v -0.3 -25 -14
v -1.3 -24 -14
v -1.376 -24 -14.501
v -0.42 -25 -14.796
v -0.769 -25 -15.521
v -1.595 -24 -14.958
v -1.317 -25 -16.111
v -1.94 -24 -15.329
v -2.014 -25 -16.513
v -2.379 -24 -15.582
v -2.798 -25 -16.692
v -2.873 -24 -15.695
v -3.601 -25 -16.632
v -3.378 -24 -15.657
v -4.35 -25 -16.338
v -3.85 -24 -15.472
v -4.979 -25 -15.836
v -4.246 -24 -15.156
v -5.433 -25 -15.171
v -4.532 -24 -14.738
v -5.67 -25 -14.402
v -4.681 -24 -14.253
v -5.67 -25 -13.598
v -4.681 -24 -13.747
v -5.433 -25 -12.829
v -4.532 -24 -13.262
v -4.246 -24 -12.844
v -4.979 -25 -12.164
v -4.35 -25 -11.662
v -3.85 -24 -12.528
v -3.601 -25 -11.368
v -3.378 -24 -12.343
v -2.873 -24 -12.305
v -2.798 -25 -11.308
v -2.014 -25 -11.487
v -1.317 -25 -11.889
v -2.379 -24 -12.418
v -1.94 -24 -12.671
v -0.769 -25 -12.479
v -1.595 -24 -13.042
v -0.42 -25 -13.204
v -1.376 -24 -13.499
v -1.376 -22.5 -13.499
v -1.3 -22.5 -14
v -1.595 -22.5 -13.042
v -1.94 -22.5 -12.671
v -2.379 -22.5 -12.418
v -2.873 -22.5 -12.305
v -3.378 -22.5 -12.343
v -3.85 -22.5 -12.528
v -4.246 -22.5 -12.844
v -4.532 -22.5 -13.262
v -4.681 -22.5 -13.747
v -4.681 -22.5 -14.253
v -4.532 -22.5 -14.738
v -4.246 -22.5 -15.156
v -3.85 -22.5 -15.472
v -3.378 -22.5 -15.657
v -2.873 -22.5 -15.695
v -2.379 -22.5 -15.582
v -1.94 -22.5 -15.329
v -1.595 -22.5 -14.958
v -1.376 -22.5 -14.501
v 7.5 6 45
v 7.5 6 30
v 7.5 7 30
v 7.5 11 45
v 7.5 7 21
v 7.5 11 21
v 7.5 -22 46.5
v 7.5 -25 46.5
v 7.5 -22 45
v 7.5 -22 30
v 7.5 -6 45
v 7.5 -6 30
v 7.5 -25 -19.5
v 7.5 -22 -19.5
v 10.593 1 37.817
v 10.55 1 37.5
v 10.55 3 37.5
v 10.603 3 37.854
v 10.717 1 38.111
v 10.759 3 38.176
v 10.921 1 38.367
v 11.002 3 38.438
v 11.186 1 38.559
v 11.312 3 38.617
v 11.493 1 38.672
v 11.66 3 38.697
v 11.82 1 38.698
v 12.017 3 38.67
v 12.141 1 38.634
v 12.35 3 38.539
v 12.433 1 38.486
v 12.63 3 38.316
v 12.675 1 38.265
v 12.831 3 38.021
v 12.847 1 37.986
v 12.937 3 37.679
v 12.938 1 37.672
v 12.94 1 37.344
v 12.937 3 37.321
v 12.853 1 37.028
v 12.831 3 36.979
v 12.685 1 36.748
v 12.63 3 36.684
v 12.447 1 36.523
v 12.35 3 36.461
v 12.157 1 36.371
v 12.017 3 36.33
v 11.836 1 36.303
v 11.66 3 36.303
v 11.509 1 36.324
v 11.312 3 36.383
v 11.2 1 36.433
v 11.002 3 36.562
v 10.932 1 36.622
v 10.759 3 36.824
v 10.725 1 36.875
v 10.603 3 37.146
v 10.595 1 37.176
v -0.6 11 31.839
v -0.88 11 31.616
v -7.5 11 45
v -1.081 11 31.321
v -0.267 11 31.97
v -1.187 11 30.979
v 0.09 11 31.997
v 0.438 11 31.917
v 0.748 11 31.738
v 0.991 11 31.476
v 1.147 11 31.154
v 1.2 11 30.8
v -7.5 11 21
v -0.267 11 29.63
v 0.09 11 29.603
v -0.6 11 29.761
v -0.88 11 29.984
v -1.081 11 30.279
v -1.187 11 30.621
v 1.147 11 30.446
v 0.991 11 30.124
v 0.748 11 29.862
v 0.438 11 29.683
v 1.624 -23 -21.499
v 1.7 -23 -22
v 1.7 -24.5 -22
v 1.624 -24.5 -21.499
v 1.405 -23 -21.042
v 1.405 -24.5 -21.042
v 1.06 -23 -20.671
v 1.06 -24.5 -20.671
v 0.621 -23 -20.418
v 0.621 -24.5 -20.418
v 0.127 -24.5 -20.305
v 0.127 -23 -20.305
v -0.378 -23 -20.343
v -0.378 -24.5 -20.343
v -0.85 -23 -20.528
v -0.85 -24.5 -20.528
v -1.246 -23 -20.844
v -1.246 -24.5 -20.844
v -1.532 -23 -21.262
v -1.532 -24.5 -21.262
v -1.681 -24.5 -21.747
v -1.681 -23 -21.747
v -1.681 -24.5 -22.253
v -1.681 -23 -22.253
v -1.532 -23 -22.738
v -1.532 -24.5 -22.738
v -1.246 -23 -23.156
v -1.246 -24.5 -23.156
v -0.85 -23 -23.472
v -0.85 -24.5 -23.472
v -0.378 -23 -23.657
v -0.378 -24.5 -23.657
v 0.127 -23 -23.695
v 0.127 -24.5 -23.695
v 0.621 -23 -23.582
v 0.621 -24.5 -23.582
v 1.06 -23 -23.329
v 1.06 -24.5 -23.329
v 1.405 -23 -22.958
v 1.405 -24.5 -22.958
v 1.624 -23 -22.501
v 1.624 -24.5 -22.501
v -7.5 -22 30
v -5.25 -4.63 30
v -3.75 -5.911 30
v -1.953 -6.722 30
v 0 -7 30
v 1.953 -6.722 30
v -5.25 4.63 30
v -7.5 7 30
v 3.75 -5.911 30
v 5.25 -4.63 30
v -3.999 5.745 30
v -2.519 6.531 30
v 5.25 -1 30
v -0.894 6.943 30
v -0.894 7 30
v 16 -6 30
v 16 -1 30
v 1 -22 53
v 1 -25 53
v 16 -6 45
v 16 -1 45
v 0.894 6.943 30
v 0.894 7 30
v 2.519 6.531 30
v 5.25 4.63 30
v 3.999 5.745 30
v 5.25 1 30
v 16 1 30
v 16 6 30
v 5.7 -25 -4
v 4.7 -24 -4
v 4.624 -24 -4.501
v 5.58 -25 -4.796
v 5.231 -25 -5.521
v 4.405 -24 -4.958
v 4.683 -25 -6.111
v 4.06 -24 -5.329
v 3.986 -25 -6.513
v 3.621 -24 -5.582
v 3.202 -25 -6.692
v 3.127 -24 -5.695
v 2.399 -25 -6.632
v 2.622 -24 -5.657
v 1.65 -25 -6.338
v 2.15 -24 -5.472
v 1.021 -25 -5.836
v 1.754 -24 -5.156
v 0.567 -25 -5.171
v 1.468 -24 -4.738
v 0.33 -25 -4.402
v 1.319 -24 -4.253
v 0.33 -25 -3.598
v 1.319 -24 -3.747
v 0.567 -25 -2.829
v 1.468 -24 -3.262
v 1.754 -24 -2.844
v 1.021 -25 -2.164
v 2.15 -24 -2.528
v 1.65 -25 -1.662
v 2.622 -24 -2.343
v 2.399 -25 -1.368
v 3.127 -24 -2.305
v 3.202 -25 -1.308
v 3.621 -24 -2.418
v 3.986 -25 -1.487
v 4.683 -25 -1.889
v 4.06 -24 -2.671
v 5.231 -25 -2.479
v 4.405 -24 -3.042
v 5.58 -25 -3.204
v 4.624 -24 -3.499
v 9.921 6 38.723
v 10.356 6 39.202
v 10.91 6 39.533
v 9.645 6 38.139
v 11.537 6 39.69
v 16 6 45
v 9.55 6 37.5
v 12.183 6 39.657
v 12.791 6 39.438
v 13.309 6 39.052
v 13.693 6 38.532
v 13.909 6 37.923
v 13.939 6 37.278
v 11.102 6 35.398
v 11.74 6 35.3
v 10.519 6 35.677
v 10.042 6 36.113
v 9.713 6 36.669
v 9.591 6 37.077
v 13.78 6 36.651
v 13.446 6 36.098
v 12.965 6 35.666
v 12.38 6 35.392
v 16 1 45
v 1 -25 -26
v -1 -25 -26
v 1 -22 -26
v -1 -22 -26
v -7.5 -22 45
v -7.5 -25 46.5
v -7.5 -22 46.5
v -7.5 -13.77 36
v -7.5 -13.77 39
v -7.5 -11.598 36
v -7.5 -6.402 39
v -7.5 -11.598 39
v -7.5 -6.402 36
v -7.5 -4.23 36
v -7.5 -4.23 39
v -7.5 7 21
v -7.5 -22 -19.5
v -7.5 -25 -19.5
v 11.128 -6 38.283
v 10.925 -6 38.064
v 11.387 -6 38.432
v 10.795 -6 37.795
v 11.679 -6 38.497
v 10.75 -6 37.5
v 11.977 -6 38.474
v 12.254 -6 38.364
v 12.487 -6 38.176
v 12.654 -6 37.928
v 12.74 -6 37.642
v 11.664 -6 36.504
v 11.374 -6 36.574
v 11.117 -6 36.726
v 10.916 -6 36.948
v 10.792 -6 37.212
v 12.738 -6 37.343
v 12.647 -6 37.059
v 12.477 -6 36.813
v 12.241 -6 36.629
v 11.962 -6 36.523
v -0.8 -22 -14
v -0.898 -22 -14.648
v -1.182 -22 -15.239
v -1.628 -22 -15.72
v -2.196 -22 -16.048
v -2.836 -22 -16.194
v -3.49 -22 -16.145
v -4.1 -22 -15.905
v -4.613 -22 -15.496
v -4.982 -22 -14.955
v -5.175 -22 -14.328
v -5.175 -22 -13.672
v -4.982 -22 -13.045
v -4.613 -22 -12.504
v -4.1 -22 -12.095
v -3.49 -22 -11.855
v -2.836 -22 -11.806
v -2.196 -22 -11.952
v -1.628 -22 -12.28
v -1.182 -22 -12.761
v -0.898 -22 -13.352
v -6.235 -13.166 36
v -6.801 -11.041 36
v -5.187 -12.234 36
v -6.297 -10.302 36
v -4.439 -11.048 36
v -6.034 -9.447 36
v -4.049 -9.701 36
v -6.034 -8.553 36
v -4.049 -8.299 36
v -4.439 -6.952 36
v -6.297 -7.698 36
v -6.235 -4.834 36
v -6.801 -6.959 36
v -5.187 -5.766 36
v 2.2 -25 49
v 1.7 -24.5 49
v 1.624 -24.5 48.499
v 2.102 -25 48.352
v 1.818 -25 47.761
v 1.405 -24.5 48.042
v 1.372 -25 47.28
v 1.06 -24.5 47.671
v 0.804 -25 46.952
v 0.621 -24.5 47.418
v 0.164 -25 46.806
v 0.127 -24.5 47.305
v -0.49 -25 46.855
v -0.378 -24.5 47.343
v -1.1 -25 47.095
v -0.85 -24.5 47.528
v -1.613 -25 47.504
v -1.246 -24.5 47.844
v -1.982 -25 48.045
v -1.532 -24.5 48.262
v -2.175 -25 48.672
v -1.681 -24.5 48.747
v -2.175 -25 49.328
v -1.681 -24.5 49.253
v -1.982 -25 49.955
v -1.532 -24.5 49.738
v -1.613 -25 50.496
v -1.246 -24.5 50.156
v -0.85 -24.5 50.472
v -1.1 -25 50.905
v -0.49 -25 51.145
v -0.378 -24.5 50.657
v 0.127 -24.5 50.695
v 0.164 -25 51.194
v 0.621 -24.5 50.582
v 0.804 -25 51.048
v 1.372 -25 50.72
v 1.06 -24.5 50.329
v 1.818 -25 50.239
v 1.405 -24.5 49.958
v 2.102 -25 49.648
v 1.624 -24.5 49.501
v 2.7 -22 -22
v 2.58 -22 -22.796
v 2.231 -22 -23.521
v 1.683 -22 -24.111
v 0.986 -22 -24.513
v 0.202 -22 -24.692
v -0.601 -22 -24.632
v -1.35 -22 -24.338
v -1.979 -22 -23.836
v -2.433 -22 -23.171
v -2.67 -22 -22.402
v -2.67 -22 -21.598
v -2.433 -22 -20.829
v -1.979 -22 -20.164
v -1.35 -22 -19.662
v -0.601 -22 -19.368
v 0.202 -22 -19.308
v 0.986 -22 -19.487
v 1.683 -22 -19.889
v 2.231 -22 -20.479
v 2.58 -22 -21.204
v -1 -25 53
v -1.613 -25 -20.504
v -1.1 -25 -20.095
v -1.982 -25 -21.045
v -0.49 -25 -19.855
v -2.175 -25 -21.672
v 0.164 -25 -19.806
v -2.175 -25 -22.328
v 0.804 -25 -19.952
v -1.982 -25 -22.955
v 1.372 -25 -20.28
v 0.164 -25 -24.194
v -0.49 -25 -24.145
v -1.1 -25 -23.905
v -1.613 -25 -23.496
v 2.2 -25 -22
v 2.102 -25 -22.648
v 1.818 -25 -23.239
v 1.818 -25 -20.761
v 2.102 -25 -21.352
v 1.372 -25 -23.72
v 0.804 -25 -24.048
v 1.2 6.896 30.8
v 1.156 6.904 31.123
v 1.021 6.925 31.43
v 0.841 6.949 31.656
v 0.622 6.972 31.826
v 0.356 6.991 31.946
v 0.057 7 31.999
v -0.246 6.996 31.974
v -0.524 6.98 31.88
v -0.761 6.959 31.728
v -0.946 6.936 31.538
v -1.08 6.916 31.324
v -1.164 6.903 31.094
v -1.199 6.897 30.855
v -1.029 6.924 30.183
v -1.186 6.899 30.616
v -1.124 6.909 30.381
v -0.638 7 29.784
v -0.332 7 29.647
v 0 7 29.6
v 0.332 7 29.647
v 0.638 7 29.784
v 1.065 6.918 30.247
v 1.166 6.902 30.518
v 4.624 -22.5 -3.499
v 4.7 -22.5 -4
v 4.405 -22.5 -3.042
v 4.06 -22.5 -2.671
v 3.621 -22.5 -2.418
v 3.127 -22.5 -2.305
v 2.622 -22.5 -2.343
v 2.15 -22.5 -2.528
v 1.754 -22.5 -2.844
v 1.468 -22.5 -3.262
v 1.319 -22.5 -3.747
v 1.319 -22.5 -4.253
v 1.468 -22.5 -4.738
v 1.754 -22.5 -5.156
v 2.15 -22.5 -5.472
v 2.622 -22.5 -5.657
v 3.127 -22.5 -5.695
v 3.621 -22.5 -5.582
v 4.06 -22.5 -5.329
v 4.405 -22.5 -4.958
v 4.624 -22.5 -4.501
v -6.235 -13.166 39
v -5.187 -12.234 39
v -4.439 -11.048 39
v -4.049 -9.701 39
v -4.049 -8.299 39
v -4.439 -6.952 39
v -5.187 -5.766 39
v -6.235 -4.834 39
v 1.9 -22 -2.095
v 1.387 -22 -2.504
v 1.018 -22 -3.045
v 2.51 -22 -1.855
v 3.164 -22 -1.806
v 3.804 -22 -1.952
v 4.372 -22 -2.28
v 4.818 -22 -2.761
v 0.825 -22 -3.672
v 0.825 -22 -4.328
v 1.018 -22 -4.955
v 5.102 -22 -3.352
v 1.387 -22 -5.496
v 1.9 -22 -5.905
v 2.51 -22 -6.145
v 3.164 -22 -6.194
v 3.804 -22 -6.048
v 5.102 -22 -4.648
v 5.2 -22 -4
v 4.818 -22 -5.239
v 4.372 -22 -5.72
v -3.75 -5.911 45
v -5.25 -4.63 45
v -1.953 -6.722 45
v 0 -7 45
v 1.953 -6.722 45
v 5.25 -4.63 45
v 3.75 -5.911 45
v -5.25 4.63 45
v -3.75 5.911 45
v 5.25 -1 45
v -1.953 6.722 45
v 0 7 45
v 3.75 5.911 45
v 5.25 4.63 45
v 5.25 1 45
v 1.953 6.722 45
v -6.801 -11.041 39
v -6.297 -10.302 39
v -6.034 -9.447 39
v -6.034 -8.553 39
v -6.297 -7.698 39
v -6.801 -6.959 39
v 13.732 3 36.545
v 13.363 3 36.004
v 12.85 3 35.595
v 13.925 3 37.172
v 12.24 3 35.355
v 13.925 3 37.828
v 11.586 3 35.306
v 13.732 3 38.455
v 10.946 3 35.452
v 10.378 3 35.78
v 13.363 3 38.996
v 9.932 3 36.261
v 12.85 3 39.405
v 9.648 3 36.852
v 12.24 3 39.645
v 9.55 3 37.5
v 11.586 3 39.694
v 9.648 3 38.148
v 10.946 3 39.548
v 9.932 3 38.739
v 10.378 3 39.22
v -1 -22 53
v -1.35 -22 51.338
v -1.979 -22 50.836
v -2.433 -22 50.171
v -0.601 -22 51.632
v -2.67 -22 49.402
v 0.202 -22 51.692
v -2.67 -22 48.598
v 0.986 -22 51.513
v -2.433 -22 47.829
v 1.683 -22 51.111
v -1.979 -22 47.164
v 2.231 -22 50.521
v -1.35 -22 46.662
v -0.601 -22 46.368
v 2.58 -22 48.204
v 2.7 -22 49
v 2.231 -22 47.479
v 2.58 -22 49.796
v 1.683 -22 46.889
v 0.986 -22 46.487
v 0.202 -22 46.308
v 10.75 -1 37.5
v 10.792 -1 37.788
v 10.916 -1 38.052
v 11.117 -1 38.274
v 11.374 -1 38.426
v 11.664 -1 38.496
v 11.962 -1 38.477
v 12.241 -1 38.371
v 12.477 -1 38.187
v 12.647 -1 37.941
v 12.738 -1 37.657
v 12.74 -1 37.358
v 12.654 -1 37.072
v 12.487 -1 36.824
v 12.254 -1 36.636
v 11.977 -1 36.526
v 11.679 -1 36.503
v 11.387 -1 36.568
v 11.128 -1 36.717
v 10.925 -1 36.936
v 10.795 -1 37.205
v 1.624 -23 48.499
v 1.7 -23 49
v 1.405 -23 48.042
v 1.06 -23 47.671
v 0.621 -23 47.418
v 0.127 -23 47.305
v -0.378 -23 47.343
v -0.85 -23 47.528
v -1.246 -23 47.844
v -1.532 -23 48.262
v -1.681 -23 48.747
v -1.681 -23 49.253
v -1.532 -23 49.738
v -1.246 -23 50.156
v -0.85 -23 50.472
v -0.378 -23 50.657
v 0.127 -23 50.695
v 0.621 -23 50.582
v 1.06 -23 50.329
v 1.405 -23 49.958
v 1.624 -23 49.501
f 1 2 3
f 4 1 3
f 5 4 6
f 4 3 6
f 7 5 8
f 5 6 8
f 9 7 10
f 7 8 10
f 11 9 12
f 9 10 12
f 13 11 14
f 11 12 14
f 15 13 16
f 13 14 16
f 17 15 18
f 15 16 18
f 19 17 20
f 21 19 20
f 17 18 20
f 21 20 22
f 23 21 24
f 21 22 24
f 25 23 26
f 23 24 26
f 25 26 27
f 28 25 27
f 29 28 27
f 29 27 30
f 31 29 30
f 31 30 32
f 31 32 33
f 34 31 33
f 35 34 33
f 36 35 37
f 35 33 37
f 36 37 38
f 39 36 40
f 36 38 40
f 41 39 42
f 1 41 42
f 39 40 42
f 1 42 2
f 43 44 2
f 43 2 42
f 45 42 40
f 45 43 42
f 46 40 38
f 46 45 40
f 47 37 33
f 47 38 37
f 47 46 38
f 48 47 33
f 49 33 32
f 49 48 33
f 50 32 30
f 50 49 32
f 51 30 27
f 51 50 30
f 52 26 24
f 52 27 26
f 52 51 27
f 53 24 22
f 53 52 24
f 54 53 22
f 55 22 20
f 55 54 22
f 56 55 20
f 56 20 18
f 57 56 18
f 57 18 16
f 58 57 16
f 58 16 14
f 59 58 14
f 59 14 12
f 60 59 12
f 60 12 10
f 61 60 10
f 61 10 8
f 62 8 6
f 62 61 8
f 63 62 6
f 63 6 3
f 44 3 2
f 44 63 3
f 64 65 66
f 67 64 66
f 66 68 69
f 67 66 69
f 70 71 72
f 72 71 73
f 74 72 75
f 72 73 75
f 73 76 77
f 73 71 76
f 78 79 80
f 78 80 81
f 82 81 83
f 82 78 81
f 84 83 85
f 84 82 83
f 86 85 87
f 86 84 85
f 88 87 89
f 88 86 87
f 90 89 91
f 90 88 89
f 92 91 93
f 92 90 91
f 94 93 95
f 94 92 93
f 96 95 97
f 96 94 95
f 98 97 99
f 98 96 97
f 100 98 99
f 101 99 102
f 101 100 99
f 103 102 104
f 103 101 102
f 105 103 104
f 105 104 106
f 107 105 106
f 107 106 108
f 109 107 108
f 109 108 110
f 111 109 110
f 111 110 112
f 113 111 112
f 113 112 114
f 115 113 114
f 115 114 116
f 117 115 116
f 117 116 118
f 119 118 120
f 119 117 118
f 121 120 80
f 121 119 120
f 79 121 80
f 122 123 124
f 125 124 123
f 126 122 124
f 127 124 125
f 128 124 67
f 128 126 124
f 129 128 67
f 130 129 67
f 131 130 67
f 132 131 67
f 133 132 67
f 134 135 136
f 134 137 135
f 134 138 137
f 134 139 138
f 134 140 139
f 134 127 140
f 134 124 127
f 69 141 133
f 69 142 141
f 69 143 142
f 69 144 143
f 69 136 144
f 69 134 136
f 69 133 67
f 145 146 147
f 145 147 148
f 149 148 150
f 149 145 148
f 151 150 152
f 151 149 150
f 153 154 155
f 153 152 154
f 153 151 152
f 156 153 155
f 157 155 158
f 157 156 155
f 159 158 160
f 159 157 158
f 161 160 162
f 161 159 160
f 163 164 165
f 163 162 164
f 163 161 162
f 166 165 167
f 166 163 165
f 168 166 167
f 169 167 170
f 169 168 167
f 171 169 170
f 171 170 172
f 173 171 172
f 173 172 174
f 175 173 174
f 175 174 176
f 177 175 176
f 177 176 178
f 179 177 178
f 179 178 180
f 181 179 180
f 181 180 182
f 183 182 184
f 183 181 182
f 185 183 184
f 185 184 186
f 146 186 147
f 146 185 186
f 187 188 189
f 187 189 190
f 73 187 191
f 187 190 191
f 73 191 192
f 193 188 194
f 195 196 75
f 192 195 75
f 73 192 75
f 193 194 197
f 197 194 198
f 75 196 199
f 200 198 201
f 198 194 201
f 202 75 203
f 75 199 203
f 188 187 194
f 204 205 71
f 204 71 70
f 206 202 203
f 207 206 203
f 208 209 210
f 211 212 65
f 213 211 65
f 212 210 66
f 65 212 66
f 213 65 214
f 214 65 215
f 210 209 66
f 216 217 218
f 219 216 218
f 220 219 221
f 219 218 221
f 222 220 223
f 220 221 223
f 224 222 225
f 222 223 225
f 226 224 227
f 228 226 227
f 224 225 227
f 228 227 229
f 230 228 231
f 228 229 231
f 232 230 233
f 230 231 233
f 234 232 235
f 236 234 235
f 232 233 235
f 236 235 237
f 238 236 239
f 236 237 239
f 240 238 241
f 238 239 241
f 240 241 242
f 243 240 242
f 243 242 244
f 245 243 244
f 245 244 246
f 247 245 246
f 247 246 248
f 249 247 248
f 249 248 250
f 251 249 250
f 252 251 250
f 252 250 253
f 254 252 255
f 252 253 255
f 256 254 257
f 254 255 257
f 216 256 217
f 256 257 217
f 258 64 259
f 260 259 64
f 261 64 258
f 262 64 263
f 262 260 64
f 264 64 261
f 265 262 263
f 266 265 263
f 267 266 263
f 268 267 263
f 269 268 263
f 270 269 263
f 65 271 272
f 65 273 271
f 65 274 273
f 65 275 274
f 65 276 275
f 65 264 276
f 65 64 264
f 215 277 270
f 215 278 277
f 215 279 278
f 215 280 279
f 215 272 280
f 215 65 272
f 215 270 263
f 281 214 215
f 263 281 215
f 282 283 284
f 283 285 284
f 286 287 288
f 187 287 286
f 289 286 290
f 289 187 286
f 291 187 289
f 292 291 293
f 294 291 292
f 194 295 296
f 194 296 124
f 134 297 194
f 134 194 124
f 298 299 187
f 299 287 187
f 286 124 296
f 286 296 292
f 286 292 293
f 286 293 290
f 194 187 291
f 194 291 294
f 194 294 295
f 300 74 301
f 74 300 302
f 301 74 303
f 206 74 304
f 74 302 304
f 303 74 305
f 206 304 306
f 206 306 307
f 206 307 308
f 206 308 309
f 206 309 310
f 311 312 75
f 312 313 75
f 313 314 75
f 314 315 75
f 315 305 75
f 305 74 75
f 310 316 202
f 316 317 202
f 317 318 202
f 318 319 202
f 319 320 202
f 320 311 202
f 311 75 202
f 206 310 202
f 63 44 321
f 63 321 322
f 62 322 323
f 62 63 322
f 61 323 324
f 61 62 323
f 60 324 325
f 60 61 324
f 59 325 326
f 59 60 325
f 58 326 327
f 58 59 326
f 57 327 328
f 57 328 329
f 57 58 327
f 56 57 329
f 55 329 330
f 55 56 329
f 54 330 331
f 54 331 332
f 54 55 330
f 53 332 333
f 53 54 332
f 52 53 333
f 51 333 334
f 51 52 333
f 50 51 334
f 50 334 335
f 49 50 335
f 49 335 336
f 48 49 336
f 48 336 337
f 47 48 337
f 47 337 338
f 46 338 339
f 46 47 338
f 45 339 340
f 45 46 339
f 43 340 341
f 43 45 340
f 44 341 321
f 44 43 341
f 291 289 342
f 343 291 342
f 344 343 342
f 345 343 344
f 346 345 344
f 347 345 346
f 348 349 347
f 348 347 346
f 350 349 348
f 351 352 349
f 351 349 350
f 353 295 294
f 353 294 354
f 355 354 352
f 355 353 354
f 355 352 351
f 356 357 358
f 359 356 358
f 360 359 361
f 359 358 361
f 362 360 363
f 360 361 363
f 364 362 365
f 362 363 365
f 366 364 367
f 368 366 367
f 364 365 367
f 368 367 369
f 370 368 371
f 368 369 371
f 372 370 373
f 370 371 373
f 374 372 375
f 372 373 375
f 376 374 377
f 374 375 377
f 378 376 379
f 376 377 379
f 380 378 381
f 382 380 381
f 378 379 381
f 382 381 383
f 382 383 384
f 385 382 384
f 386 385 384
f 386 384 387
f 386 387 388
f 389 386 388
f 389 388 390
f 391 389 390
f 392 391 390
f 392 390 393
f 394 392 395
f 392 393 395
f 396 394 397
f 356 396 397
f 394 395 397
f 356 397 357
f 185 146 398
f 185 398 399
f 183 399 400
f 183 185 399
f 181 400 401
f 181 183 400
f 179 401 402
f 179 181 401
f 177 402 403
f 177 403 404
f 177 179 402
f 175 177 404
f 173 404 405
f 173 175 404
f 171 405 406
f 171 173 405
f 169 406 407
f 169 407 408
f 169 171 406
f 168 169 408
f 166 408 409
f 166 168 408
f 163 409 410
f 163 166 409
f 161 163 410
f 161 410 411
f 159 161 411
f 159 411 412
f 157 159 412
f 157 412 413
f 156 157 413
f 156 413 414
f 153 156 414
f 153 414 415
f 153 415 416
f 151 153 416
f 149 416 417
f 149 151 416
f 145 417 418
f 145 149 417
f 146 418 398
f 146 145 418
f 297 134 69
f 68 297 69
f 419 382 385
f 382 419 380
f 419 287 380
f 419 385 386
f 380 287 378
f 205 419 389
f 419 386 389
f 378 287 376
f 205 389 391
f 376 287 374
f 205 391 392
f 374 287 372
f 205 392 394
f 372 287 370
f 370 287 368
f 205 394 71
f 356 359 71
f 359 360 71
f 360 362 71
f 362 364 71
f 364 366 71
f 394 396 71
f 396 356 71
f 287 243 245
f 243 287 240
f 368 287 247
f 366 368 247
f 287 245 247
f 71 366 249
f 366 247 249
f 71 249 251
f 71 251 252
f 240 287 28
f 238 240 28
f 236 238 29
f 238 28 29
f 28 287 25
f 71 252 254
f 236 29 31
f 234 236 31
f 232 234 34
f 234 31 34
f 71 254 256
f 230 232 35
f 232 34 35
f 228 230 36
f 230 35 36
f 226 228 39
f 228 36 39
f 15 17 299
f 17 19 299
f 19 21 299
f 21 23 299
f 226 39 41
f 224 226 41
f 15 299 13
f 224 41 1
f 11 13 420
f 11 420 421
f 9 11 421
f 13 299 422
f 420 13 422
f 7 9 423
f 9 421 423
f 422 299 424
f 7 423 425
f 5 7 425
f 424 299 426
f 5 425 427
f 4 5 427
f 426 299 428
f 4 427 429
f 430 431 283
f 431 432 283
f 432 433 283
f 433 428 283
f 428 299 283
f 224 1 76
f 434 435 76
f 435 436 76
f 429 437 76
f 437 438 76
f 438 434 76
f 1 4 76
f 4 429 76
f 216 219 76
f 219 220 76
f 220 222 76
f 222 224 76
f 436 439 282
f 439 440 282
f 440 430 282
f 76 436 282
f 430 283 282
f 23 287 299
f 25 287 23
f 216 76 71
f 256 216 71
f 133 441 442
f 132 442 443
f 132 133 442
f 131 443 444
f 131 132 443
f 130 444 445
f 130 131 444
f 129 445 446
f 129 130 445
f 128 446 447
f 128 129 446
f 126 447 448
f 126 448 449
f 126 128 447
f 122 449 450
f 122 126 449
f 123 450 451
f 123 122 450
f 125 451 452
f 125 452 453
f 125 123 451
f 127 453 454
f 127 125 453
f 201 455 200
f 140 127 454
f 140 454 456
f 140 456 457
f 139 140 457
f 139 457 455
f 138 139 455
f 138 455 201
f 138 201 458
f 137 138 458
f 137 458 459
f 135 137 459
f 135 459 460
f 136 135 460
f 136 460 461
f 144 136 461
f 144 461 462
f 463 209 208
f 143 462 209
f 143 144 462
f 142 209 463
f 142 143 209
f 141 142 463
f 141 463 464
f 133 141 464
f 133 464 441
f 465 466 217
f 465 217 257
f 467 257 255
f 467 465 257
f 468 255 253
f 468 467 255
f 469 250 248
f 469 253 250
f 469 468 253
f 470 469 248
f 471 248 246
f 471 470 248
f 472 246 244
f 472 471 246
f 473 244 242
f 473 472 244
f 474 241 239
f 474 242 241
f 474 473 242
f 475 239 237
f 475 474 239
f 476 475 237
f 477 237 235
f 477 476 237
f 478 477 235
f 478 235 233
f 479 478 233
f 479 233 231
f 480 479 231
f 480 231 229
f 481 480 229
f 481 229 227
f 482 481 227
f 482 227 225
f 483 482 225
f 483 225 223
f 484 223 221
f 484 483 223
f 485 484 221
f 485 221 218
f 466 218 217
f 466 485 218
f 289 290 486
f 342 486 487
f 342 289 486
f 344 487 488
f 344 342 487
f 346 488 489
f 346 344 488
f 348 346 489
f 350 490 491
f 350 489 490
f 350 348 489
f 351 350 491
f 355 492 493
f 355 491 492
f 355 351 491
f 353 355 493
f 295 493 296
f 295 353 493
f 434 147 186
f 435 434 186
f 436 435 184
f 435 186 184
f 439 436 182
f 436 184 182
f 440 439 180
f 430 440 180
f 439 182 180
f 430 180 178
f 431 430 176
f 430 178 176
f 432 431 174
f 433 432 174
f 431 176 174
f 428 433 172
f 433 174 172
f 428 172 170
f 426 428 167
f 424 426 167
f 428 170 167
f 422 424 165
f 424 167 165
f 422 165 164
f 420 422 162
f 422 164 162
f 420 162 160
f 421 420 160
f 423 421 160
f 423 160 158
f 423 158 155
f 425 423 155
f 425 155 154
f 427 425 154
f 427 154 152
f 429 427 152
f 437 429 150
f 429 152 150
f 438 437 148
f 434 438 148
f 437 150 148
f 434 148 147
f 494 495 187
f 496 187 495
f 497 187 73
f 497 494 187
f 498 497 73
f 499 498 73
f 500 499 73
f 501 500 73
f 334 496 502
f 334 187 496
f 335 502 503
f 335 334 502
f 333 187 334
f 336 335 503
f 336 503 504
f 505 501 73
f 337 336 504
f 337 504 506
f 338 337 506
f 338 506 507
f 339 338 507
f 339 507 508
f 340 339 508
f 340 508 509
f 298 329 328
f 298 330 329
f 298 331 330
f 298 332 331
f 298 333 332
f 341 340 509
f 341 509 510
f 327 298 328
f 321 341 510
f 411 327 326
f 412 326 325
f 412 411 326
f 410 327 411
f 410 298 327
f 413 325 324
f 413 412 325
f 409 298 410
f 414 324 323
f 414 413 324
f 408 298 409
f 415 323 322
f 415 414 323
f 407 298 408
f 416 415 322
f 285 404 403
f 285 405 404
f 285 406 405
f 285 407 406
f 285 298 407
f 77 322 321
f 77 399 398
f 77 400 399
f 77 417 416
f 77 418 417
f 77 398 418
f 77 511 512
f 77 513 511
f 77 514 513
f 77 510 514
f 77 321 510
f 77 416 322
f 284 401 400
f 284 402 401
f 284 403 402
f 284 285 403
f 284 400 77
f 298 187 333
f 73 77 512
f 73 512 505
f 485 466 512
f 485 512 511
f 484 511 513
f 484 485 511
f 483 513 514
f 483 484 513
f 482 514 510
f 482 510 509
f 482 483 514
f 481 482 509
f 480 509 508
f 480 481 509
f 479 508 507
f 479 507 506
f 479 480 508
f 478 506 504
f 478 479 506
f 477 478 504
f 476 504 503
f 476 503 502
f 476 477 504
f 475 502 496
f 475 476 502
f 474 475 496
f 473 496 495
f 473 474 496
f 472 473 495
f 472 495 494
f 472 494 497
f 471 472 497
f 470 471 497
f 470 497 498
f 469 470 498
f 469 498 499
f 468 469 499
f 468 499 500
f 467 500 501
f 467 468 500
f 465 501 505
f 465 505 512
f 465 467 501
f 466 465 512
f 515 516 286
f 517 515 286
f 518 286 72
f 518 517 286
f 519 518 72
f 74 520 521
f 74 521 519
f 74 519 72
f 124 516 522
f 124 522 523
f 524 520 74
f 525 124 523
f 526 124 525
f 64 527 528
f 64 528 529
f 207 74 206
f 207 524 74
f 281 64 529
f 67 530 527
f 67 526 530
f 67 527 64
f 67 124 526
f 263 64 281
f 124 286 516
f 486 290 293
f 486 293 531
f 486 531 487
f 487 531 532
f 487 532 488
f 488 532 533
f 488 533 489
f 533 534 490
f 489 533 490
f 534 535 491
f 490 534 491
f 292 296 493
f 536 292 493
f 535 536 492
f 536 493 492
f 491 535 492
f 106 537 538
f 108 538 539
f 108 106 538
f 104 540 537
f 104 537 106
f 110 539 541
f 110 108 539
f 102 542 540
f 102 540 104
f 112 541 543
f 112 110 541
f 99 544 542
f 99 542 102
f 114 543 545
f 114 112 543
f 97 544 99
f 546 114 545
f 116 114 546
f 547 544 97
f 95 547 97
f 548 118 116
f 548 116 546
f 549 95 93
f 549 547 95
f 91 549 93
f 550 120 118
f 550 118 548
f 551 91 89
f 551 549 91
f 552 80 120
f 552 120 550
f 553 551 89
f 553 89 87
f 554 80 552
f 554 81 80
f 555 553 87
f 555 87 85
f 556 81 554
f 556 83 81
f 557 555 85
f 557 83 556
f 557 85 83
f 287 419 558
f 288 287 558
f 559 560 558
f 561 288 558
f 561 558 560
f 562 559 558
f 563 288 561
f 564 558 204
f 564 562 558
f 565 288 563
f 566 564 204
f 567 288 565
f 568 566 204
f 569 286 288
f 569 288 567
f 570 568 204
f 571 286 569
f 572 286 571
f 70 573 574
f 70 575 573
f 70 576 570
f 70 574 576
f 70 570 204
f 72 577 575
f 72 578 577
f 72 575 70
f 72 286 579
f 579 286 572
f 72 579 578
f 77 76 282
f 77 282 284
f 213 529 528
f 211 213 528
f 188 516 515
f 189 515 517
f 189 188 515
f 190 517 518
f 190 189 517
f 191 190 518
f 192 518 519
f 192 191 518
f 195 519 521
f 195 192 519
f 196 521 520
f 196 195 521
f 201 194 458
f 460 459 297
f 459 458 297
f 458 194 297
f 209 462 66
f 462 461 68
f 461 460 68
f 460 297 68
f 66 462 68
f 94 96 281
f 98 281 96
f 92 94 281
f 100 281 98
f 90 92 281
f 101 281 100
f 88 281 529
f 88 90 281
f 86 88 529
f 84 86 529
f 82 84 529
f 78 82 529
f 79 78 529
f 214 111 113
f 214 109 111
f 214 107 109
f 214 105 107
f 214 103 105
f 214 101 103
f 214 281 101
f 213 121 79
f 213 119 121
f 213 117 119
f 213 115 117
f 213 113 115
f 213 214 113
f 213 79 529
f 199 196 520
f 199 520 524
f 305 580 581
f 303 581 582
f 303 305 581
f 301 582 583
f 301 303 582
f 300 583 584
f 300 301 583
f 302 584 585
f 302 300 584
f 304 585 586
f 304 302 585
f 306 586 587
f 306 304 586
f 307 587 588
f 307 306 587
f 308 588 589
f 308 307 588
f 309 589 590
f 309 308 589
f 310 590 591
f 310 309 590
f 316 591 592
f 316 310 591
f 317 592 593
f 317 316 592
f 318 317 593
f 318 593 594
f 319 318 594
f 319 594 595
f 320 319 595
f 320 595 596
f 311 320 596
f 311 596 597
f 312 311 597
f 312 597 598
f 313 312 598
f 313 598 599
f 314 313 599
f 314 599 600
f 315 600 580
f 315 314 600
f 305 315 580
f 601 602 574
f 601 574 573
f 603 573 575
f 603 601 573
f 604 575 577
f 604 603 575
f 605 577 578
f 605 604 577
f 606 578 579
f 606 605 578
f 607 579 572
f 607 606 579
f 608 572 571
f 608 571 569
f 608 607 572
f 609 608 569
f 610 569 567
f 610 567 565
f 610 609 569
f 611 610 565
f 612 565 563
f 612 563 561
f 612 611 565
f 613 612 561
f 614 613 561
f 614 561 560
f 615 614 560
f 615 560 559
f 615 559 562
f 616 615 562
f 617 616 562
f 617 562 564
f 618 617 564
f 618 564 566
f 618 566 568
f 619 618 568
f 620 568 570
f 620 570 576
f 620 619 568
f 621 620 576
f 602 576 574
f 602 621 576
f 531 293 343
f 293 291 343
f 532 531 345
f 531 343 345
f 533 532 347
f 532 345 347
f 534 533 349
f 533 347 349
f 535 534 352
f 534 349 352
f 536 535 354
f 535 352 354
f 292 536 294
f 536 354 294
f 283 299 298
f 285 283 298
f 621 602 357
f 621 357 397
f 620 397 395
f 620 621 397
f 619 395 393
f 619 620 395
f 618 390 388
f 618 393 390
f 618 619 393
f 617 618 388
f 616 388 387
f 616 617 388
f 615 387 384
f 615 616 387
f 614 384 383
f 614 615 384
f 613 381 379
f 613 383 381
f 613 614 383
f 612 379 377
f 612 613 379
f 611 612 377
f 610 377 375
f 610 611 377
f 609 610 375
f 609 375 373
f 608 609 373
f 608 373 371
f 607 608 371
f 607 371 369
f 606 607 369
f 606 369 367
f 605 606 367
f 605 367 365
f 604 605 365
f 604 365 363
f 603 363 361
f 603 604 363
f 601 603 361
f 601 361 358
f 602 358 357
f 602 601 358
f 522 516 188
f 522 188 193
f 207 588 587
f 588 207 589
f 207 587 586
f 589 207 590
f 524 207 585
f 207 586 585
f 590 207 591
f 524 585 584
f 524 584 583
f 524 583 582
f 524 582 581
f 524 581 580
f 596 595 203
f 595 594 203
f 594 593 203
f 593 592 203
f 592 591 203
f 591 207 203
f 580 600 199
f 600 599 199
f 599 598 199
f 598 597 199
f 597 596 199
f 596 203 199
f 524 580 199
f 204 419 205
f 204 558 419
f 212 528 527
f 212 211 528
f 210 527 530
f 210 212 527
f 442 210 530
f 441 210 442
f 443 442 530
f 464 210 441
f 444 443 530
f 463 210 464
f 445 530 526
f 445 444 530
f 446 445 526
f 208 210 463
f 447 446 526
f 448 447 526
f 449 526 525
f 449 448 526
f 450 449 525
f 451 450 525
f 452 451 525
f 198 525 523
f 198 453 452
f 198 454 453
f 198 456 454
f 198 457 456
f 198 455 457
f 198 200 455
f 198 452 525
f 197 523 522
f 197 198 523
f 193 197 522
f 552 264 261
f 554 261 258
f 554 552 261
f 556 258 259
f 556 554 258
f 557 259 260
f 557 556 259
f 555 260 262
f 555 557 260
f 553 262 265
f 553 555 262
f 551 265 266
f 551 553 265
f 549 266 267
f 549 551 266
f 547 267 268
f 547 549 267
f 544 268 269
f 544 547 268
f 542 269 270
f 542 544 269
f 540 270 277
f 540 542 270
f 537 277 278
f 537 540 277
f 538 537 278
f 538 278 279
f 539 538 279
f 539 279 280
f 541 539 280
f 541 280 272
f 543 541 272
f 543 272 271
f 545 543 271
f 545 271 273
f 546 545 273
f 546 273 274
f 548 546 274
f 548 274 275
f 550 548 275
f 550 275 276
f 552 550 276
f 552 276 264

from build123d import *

# Parameters (mm, degrees)
CYLINDER099_R               = 3
CYLINDER099_DEPTH           = 3
CYLINDER098_R               = 5
CYLINDER098_DEPTH           = 3
CYLINDER090_R               = 1.2
CYLINDER090_DEPTH           = 13
CYLINDER091_R               = 1
CYLINDER091_DEPTH           = 12
CYLINDER091_ROLL_ANGLE      = 89.999919
CYLINDER091_PITCH_ANGLE     = -3.6e-05
CYLINDER091_PLACEMENT_ANGLE = 179.999964
CYLINDER069_R               = 2.2
CYLINDER069_DEPTH           = 12
CYLINDER069_ROLL_ANGLE      = 89.999919
CYLINDER069_PITCH_ANGLE     = -3.6e-05
CYLINDER069_PLACEMENT_ANGLE = 179.999964
CYLINDER068_R               = 1.2
CYLINDER068_DEPTH           = 12
CYLINDER068_ROLL_ANGLE      = 89.999919
CYLINDER068_PITCH_ANGLE     = -3.6e-05
CYLINDER068_PLACEMENT_ANGLE = 179.999964
BOX406016_W                 = 49
BOX406016_H                 = 2
BOX406016_DEPTH             = 32
BOX406008016_W              = 9
BOX406008016_H              = 12
BOX406008016_DEPTH          = 15
BOX406017_W                 = 16
BOX406017_H                 = 10.5
BOX406017_DEPTH             = 28
CYLINDER067_R               = 7
CYLINDER067_DEPTH           = 26
COMMON004_PLACEMENT_ANGLE   = 90
BOX406008015_W              = 15
BOX406008015_H              = 31
BOX406008015_DEPTH          = 15
BOX406008017_W              = 15
BOX406008017_H              = 4
BOX406008017_DEPTH          = 24
CYLINDER096_R               = 1.7
CYLINDER096_DEPTH           = 21
BOX_W                       = 15
BOX_H                       = 3
BOX_DEPTH                   = 8
CYLINDER097_R               = 1.7
CYLINDER097_DEPTH           = 21
BOX406008018_W              = 15
BOX406008018_H              = 3
BOX406008018_DEPTH          = 8
CHAMFER005_SIZE             = 1
CYLINDER093_R               = 1.7
CYLINDER093_DEPTH           = 21
CYLINDER092_R               = 1.7
CYLINDER092_DEPTH           = 21
BOX406008014_W              = 15
BOX406008014_H              = 3
BOX406008014_DEPTH          = 63
CHAMFER006_SIZE             = 1
CHAMFER007_SIZE             = 6.5
CHAMFER009_SIZE             = 0.5
CHAMFER010_SIZE             = 0.5


with BuildPart() as cylinder099:
    # Cylinder099 → Cylinder099 (new body)
    with BuildSketch(Plane(origin=(-9, -9, 36), x_dir=(1, 0, 0), z_dir=(0, 0, 1))):
        Circle(CYLINDER099_R)
    extrude(amount=CYLINDER099_DEPTH)


with BuildPart() as cut081:
    # Cylinder098 → Cylinder098 (new body)
    with BuildSketch(Plane(origin=(-9, -9, 36), x_dir=(1, 0, 0), z_dir=(0, 0, 1))):
        Circle(CYLINDER098_R)
    extrude(amount=CYLINDER098_DEPTH)

    # Cut081: cut Cylinder099
    add(cylinder099.part, mode=Mode.SUBTRACT)


with BuildPart() as cylinder084:
    # Cylinder090 → Cylinder090 (new body)
    with BuildSketch(Plane(origin=(0, 16, 35.8), x_dir=(1, 0, 0), z_dir=(0, -1, 0))):
        Circle(CYLINDER090_R)
    extrude(amount=CYLINDER090_DEPTH)


with BuildPart() as cylinder091:
    # Cylinder091 → Cylinder091 (new body)
    with BuildSketch(Plane.XY):
        Circle(CYLINDER091_R)
    extrude(amount=CYLINDER091_DEPTH)


with BuildPart() as cylinder091_1:
    # Cylinder091 roll: moved
    add(cylinder091.part.rotate(Axis((0, 0, 0), (1, 0, 0)), CYLINDER091_ROLL_ANGLE))


with BuildPart() as cylinder091_2:
    # Cylinder091 pitch: moved
    add(cylinder091_1.part.rotate(Axis((0, 0, 0), (0, 1, 0)), CYLINDER091_PITCH_ANGLE))


with BuildPart() as cylinder091_3:
    # Cylinder091 placement: moved
    add(cylinder091_2.part.moved(Location((11.75, -12, 42.5))).rotate(Axis((11.75, -12, 42.5), (0, 0, 1)), CYLINDER091_PLACEMENT_ANGLE))


with BuildPart() as cylinder069:
    # Cylinder069 → Cylinder069 (new body)
    with BuildSketch(Plane.XY):
        Circle(CYLINDER069_R)
    extrude(amount=CYLINDER069_DEPTH)


with BuildPart() as cylinder069_1:
    # Cylinder069 roll: moved
    add(cylinder069.part.rotate(Axis((0, 0, 0), (1, 0, 0)), CYLINDER069_ROLL_ANGLE))


with BuildPart() as cylinder069_2:
    # Cylinder069 pitch: moved
    add(cylinder069_1.part.rotate(Axis((0, 0, 0), (0, 1, 0)), CYLINDER069_PITCH_ANGLE))


with BuildPart() as cylinder069_3:
    # Cylinder069 placement: moved
    add(cylinder069_2.part.moved(Location((11.75, 3, 42.5))).rotate(Axis((11.75, 3, 42.5), (0, 0, 1)), CYLINDER069_PLACEMENT_ANGLE))


with BuildPart() as fusion103077013004017011:
    # Cylinder068 → Cylinder068 (new body)
    with BuildSketch(Plane.XY):
        Circle(CYLINDER068_R)
    extrude(amount=CYLINDER068_DEPTH)


with BuildPart() as fusion103077013004017011_1:
    # Cylinder068 roll: moved
    add(fusion103077013004017011.part.rotate(Axis((0, 0, 0), (1, 0, 0)), CYLINDER068_ROLL_ANGLE))


with BuildPart() as fusion103077013004017011_2:
    # Cylinder068 pitch: moved
    add(fusion103077013004017011_1.part.rotate(Axis((0, 0, 0), (0, 1, 0)), CYLINDER068_PITCH_ANGLE))


with BuildPart() as fusion103077013004017011_3:
    # Cylinder068 placement: moved
    add(fusion103077013004017011_2.part.moved(Location((11.75, 0, 42.5))).rotate(Axis((11.75, 0, 42.5), (0, 0, 1)), CYLINDER068_PLACEMENT_ANGLE))

    # Fusion103077013: union Cylinder069
    add(cylinder069_3.part)

    # Fusion103077013004017011: union Cylinder091
    add(cylinder091_3.part)


with BuildPart() as clamp_slot:
    # Box406016 → Box406016 (new body)
    with BuildSketch(Plane(origin=(48.48, 1, 22), x_dir=(-1, 0, 0), z_dir=(0, 0, 1))):
        with Locations((24.5, 1)):
            Rectangle(BOX406016_W, BOX406016_H)
    extrude(amount=BOX406016_DEPTH)


with BuildPart() as cube351:
    # Box406008016 → Box406008016 (new body)
    with BuildSketch(Plane(origin=(7, -6, 35), x_dir=(1, 0, 0), z_dir=(0, 0, 1))):
        with Locations((4.5, 6)):
            Rectangle(BOX406008016_W, BOX406008016_H)
    extrude(amount=BOX406008016_DEPTH)


with BuildPart() as gearbox001:
    # Box406017 → Box406017 (new body)
    with BuildSketch(Plane(origin=(-8, -5.25, 18), x_dir=(1, 0, 0), z_dir=(0, 0, 1))):
        with Locations((8, 5.25)):
            Rectangle(BOX406017_W, BOX406017_H)
    extrude(amount=BOX406017_DEPTH)


with BuildPart() as motor_hole:
    # Cylinder067 → Cylinder067 (new body)
    with BuildSketch(Plane.XY.offset(20)):
        Circle(CYLINDER067_R)
    extrude(amount=CYLINDER067_DEPTH)

    # Common004: intersect gearbox001
    add(gearbox001.part, mode=Mode.INTERSECT)


with BuildPart() as motor_hole_1:
    # Common004 placement: moved
    add(motor_hole.part.moved(Location((0, 0, 5))).rotate(Axis((0, 0, 5), (0, 0, 1)), COMMON004_PLACEMENT_ANGLE))


with BuildPart() as cut075:
    # Box406008015 → Box406008015 (new body)
    with BuildSketch(Plane(origin=(-7.5, -22, 35), x_dir=(1, 0, 0), z_dir=(0, 0, 1))):
        with Locations((7.5, 15.5)):
            Rectangle(BOX406008015_W, BOX406008015_H)
    extrude(amount=BOX406008015_DEPTH)

    # Cut073: cut motor-hole
    add(motor_hole_1.part, mode=Mode.SUBTRACT)

    # Fusion103077013004017010: union Cube351
    add(cube351.part)

    # Cut074: cut clamp-slot
    add(clamp_slot.part, mode=Mode.SUBTRACT)

    # Cut075: cut Fusion103077013004017011
    add(fusion103077013004017011_3.part, mode=Mode.SUBTRACT)


with BuildPart() as cut082:
    # Box406008017 → Box406008017 (new body)
    with BuildSketch(Plane(origin=(-7.5, 7, 26), x_dir=(1, 0, 0), z_dir=(0, 0, 1))):
        with Locations((7.5, 2)):
            Rectangle(BOX406008017_W, BOX406008017_H)
    extrude(amount=BOX406008017_DEPTH)

    # Fusion103077013004017012: union Cut075
    add(cut075.part)

    # Cut076: cut Cylinder084
    add(cylinder084.part, mode=Mode.SUBTRACT)


with BuildPart() as cut082_1:
    # Cut076 placement: moved
    add(cut082.part.moved(Location((0, 0, -5))))

    # Cut082: cut Cut081
    add(cut081.part, mode=Mode.SUBTRACT)


with BuildPart() as cylinder096:
    # Cylinder096 → Cylinder096 (new body)
    with BuildSketch(Plane(origin=(0, -13, 49), x_dir=(1, 0, 0), z_dir=(0, -1, 0))):
        Circle(CYLINDER096_R)
    extrude(amount=CYLINDER096_DEPTH)


with BuildPart() as cut080:
    # Box → Box (new body)
    with BuildSketch(Plane(origin=(-7.5, -25, 45), x_dir=(1, 0, 0), z_dir=(0, 0, 1))):
        with Locations((7.5, 1.5)):
            Rectangle(BOX_W, BOX_H)
    extrude(amount=BOX_DEPTH)

    # Cut080: cut Cylinder096
    add(cylinder096.part, mode=Mode.SUBTRACT)


with BuildPart() as cylinder097:
    # Cylinder097 → Cylinder097 (new body)
    with BuildSketch(Plane(origin=(0, -13, -22), x_dir=(1, 0, 0), z_dir=(0, -1, 0))):
        Circle(CYLINDER097_R)
    extrude(amount=CYLINDER097_DEPTH)


with BuildPart() as chamfer005:
    # Box406008018 → Box406008018 (new body)
    with BuildSketch(Plane(origin=(-7.5, -25, -26), x_dir=(1, 0, 0), z_dir=(0, 0, 1))):
        with Locations((7.5, 1.5)):
            Rectangle(BOX406008018_W, BOX406008018_H)
    extrude(amount=BOX406008018_DEPTH)

    # Cut079: cut Cylinder097
    add(cylinder097.part, mode=Mode.SUBTRACT)

    # Fusion103077013004017015: union Cut080
    add(cut080.part)

    # Chamfer005
    chamfer005_edges = [chamfer005.edges().sort_by_distance(p)[0] for p in [
        (-1.7, -22, -22),
        (-1.7, -22, 49),
    ]]
    chamfer(chamfer005_edges, length=CHAMFER005_SIZE)


with BuildPart() as cylinder093:
    # Cylinder093 → Cylinder093 (new body)
    with BuildSketch(Plane(origin=(3, -13, -4), x_dir=(1, 0, 0), z_dir=(0, -1, 0))):
        Circle(CYLINDER093_R)
    extrude(amount=CYLINDER093_DEPTH)


with BuildPart() as fusion103077013004017013:
    # Cylinder092 → Cylinder092 (new body)
    with BuildSketch(Plane(origin=(-3, -13, -14), x_dir=(1, 0, 0), z_dir=(0, -1, 0))):
        Circle(CYLINDER092_R)
    extrude(amount=CYLINDER092_DEPTH)

    # Fusion103077013004017013: union Cylinder093
    add(cylinder093.part)


with BuildPart() as chamfer010:
    # Box406008014 → Box406008014 (new body)
    with BuildSketch(Plane(origin=(-7.5, -25, -18), x_dir=(1, 0, 0), z_dir=(0, 0, 1))):
        with Locations((7.5, 1.5)):
            Rectangle(BOX406008014_W, BOX406008014_H)
    extrude(amount=BOX406008014_DEPTH)

    # Cut077: cut Fusion103077013004017013
    add(fusion103077013004017013.part, mode=Mode.SUBTRACT)

    # Chamfer006
    chamfer006_edges = [chamfer010.edges().sort_by_distance(p)[0] for p in [
        (-4.7, -25, -14),
        (1.3, -25, -4),
    ]]
    chamfer(chamfer006_edges, length=CHAMFER006_SIZE)

    # Fusion103077013004017016: union Chamfer005
    add(chamfer005.part)

    # Chamfer007
    chamfer007_edges = [chamfer010.edges().sort_by_distance(p)[0] for p in [
        (-7.5, -23.5, -26),
        (7.5, -23.5, -26),
        (7.5, -23.5, 53),
        (-7.5, -23.5, 53),
    ]]
    chamfer(chamfer007_edges, length=CHAMFER007_SIZE)

    # Fusion103077013004017017: union Cut082
    add(cut082_1.part)

    # Chamfer009
    chamfer009_edges = [chamfer010.edges().sort_by_distance(p)[0] for p in [
        (-4.7, -22, -14),
        (1.3, -22, -4),
    ]]
    chamfer(chamfer009_edges, length=CHAMFER009_SIZE)

    # Chamfer010
    chamfer010_edges = [chamfer010.edges().sort_by_distance(p)[0] for p in [
        (-1.7, -25, -22),
        (-1.7, -25, 49),
    ]]
    chamfer(chamfer010_edges, length=CHAMFER010_SIZE)


solid = chamfer010.part
